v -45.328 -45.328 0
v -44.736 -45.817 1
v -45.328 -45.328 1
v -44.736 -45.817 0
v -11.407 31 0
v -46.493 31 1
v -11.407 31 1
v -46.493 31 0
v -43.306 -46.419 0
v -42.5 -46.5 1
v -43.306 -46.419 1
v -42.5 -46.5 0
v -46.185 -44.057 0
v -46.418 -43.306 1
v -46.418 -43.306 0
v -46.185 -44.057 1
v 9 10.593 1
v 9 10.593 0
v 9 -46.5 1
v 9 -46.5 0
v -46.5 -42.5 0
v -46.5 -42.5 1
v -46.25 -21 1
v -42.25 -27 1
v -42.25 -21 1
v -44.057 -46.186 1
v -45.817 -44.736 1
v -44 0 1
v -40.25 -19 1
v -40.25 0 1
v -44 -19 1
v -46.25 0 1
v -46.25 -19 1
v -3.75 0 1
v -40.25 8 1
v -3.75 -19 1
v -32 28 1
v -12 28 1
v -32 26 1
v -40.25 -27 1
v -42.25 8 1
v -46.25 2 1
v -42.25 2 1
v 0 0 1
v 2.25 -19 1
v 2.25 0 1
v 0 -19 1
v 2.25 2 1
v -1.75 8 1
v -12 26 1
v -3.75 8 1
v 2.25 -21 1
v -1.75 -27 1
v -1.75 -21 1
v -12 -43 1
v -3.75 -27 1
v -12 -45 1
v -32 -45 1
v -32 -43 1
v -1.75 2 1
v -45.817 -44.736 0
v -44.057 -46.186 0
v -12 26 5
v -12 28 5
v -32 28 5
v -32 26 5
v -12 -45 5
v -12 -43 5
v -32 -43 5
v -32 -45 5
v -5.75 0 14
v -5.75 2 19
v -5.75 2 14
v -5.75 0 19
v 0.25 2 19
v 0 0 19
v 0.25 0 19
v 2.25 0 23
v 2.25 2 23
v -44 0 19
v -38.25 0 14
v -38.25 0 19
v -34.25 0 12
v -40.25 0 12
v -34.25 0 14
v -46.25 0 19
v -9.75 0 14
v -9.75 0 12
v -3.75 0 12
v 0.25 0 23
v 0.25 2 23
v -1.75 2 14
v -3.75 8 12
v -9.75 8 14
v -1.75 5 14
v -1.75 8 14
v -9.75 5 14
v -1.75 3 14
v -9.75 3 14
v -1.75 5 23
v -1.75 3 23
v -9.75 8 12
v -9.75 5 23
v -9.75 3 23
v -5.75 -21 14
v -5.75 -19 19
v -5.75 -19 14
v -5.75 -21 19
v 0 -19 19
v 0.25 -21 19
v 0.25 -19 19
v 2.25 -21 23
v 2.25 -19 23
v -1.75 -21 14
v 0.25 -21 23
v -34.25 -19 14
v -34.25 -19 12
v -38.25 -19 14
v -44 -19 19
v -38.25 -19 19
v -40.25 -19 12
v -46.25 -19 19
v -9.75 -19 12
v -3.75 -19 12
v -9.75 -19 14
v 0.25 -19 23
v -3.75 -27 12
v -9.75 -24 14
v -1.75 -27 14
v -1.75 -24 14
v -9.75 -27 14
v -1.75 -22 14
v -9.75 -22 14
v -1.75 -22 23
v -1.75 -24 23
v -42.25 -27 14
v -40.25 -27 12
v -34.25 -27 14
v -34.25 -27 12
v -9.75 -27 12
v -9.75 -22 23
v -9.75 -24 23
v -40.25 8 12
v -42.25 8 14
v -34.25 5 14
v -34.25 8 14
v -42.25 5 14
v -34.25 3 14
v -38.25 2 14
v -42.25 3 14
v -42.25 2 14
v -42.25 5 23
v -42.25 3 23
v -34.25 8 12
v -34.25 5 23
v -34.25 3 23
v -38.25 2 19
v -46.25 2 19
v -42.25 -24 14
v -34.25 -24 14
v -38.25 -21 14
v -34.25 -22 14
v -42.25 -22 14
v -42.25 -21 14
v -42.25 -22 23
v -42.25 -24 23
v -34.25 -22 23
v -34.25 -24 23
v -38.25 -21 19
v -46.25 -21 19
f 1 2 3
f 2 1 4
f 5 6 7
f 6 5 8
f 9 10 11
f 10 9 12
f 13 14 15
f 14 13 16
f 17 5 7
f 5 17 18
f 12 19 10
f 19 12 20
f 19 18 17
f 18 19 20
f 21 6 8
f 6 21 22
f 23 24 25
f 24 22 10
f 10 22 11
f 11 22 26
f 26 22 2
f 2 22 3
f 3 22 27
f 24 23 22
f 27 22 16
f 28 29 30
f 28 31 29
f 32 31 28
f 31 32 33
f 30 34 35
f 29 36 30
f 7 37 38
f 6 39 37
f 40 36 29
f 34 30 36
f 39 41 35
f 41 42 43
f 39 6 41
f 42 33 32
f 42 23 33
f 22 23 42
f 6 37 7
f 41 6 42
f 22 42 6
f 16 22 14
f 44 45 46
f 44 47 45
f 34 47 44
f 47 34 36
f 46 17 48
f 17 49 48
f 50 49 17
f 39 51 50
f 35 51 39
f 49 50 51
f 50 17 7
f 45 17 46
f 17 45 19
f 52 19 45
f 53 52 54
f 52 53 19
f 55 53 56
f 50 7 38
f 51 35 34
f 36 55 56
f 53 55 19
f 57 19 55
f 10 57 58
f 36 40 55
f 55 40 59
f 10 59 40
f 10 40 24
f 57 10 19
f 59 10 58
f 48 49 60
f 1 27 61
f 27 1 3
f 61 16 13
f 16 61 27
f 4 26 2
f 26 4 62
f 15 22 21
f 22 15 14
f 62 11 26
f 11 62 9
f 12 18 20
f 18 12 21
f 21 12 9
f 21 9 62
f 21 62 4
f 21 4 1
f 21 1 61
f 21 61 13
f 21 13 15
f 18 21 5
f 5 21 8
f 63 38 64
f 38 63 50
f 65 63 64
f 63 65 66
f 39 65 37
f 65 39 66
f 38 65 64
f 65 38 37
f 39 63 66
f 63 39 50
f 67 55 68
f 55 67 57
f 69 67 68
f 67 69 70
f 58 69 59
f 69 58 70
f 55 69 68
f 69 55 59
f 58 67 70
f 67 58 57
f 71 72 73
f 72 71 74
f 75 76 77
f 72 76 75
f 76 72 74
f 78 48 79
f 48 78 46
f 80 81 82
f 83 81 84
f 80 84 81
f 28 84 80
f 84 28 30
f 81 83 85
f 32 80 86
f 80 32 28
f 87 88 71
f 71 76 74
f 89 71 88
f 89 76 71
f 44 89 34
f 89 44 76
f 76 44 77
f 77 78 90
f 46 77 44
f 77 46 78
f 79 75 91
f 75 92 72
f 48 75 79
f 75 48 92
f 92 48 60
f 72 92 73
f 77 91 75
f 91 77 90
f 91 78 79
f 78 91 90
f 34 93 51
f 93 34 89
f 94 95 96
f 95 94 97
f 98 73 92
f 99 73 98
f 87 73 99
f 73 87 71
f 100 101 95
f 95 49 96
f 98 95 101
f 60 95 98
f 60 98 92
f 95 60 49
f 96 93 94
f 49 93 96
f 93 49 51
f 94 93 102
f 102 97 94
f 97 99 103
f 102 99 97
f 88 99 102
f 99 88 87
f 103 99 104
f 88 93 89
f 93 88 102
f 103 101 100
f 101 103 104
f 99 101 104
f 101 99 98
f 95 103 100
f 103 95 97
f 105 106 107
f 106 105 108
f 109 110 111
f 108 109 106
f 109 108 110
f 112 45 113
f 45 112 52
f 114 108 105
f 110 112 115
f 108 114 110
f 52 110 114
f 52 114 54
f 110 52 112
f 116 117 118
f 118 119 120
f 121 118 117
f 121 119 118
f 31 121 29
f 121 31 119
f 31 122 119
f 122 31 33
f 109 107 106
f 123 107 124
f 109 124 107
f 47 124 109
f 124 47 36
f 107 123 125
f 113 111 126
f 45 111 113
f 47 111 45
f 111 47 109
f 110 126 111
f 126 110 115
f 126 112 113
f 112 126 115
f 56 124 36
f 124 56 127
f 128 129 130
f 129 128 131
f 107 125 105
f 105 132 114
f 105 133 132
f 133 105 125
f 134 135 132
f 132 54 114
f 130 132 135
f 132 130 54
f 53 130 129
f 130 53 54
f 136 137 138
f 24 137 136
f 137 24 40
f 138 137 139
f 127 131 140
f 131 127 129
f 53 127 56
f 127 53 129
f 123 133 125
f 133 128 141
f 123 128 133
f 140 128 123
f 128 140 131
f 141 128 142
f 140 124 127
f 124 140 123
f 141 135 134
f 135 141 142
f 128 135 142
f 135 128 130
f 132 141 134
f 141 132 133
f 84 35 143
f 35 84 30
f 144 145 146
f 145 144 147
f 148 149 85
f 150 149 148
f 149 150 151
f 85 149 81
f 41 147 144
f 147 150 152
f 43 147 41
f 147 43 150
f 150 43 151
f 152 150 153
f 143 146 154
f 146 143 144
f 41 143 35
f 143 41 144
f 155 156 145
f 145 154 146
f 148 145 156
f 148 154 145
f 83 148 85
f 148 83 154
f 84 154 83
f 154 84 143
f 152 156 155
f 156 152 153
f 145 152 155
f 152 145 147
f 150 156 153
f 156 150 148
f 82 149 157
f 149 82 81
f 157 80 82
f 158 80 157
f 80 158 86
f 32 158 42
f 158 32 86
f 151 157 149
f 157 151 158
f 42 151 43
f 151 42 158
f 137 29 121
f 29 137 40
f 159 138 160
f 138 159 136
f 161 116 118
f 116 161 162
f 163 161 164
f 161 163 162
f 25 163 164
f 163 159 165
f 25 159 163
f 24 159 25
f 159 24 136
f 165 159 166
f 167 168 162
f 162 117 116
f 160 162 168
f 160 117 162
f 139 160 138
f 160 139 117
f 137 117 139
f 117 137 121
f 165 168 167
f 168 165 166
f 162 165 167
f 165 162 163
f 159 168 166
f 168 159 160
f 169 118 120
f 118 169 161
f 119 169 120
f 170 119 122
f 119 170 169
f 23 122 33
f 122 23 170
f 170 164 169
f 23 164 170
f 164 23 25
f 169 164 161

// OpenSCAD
echo(version=version());
$fn = 80 / 1;
e=0.01; //epsilon
//height = .765;
//paisley_width = 15;
//paisley_height = 15;
//flower_width = 10;
//flower_height = 10;
container_height = 25;

debug = false;
show_paisley = true;
show_flowers = false;
show_board = false;
show_lid = true;
show_battery = false;
battery_pack_width = 35.5;
battery_pack_height = 65;
//battery_pack_depth = 10;
battery_pack_depth = 11;
battery_pack_x_offset = battery_pack_width/2;
battery_pack_y_offset = battery_pack_height/2;
battery_clip_x_offset = battery_pack_x_offset + 1;

board_width = 27;
board_offset = board_width/2;

rotate([0,0,0]){
  translate([0,0,0])
  linear_extrude(height = 1)
    polygon(points=[[9, -46.5], [-42.5001, -46.5], [-43.3062, -46.4187], [-44.057, -46.1856], [-44.7365, -45.8168], [-45.3284, -45.3284], [-45.8168, -44.7364], [-46.1855, -44.0569], [-46.4185, -43.3061], [-46.4997, -42.5], [-46.4933, 31], [-11.4069, 31], [9, 10.5931]]);
  //stop
  translate([-32,26,0])
  cube([20, 2, 5], false);
  translate([-32,-45,0])
  cube([20, 2, 5], false);
}
//battery clips
translate([-22,-9.5,0]){
  rotate([0,0,0]){
    difference(){
      union(){
        //East clips
        //battery_clip(x, y, z, battery_pack_depth, x_rotate, y_rotate, z_rotate, show_stop, north_clip, usb_side){
        battery_clip(battery_pack_x_offset + 1.5, board_offset, 0, battery_pack_depth, 0, 0, 180, true, true, false);
        battery_clip(battery_pack_x_offset + 1.5, -board_offset, 0, battery_pack_depth, 0, 0, 180, true, false, false);
        //West clips
        battery_clip(-battery_pack_x_offset - 1.5, board_offset, 0, battery_pack_depth, 0, 0, 0, true, false, true);
        //translate([-battery_pack_x_offset-2.5, board_offset-4, 12])
        //cube([5, 4, 2], false);
        battery_clip(-battery_pack_x_offset - 1.5, -board_offset, 0, battery_pack_depth, 0, 0, 0,true,true, true);
        //translate([-battery_pack_x_offset-2.5, -board_offset, 12])
        //cube([5, 4, 2], false);
      }
      union(){
        /*
        translate([-22.3,-12.5,16])
        cube([8,4,14],center=false);
        translate([-22.3+(2.54*14),9.475,16])
        cube([3,3,10],center=false);        
        translate([-22.3+(2.54*16),9.475,16])
        cube([4,3,14],center=false);
        */

        //Large cutouts
        translate([0,0,10])
        cube([44, board_width-8, 24], true);
        translate([0,-27,10])
        cube([44, board_width-8, 24], true);
      }
    }
  }
}

module battery_clip(x, y, z, battery_pack_depth, x_rotate, y_rotate, z_rotate, show_stop, north_clip, usb_side){
  translate([x,y,z]){
    //battery clips
    clip_width = 2;
    clip_top_width = 8;
    clip_height = 8;
    clip_depth = battery_pack_depth + 3;
    clip_inside_x_offset = 4;
    clip_offset = clip_height/2;
    stop_upright_depth = 19;
    channel_depth = 9;
    rotate([x_rotate,y_rotate,z_rotate]){
      translate([0,0,0]){
        difference(){
          union(){
            //upright
            translate([-clip_width/2,-clip_offset,0])
            cube([clip_width, clip_height, clip_depth], false);
            //top
            translate([-clip_width/2,-clip_offset,clip_depth-clip_width])
            cube([clip_top_width, clip_height, clip_width], false);
            //channel
            translate([-clip_width/2,-clip_width/2,0])
            cube([clip_top_width, 2, container_height - 2], false);        
            if(show_stop){
              if(north_clip){
                //stop upright
                translate([-5,-(clip_width/2)+3,0])
                cube([8, clip_width, stop_upright_depth], false);
                if(!usb_side){
                  //stop
                  translate([-5,-(clip_width/2)+3,4])
                  cube([clip_width, clip_width, stop_upright_depth], false);
                }
              }
              else{
                //stop upright
                translate([-5,(clip_width/2)-5,0])
                cube([8, clip_width, stop_upright_depth], false);
                if(!usb_side){
                  //stop
                  translate([-5,(clip_width/2)-5,4])
                  cube([clip_width, clip_width, stop_upright_depth], false);
                }
              }
            }
          }
          union(){
            translate([-clip_width/2+clip_width,-clip_offset,0])
            cube([10, clip_height+2, clip_depth-clip_width], false);
          }
        }
      }
    }
  }
}

if(show_battery){
  translate([-battery_pack_width-4,-battery_pack_height/2 - 8,1])
  %cube([battery_pack_width, battery_pack_height, battery_pack_depth], false);
}


if(show_board){
  display_height = 4;
  frame_height = 2.5;
  board_height = .5;
  board_knockout_height = 2;
  usb_height = 2.5;
  m2_radius = 1;
  //translate([-21.5,-10,-13]){
  translate([0,2,13]){
    rotate([0,0,0]){
      difference(){
        union(){
          //board
          color("white",100)
          translate([0,0,0])
          linear_extrude(height = board_height)
          polygon(points=[[-47.85, -22.196], [-45.85, -24.196], [-0.35, -24.196], [-0.35, -20.196], [3.65, -16.196], [3.65, -6.696], [-0.35, -2.696], [-0.35, 1.304], [-45.85, 1.304], [-47.85, -0.696], [-47.85, -5.946], [-46.35, -7.446], [-46.35, -15.446], [-47.85, -16.946]]);
          //display
          color("green",100)
          translate([0,0,0])
          linear_extrude(height = display_height)
          polygon(points=[[-3.85, -2.196], [-3.85, -16.196], [-29.85, -16.196], [-29.85, -2.196]]);
          
          //display frame
          translate([0,0,0])
          linear_extrude(height = frame_height)
          polygon(points=[[-33.35, -20.696], [-0.35, -20.696], [-0.35, -2.196], [-33.35, -2.196]]);
          //usb-c connector
          color("red",100)
          translate([0,0,board_height])
          linear_extrude(height = usb_height)
          polygon(points=[[-40.85, -8.096], [-48.15, -8.096], [-48.15, -14.796], [-40.85, -14.796]]);
        }
        union(){
          translate([19.9,7.25,-1])
          cylinder(h=board_knockout_height, r=1 ,center=false);
          translate([-9.1,-7.25,-1])
          cylinder(h=board_knockout_height, r=1 ,center=false);
          translate([-9.1,7.25,-1])
          cylinder(h=board_knockout_height, r=1 ,center=false);
          translate([19.9,-7.25,-1])
          cylinder(h=board_knockout_height, r=1 ,center=false);    
        }
      }
    }
  }
}
